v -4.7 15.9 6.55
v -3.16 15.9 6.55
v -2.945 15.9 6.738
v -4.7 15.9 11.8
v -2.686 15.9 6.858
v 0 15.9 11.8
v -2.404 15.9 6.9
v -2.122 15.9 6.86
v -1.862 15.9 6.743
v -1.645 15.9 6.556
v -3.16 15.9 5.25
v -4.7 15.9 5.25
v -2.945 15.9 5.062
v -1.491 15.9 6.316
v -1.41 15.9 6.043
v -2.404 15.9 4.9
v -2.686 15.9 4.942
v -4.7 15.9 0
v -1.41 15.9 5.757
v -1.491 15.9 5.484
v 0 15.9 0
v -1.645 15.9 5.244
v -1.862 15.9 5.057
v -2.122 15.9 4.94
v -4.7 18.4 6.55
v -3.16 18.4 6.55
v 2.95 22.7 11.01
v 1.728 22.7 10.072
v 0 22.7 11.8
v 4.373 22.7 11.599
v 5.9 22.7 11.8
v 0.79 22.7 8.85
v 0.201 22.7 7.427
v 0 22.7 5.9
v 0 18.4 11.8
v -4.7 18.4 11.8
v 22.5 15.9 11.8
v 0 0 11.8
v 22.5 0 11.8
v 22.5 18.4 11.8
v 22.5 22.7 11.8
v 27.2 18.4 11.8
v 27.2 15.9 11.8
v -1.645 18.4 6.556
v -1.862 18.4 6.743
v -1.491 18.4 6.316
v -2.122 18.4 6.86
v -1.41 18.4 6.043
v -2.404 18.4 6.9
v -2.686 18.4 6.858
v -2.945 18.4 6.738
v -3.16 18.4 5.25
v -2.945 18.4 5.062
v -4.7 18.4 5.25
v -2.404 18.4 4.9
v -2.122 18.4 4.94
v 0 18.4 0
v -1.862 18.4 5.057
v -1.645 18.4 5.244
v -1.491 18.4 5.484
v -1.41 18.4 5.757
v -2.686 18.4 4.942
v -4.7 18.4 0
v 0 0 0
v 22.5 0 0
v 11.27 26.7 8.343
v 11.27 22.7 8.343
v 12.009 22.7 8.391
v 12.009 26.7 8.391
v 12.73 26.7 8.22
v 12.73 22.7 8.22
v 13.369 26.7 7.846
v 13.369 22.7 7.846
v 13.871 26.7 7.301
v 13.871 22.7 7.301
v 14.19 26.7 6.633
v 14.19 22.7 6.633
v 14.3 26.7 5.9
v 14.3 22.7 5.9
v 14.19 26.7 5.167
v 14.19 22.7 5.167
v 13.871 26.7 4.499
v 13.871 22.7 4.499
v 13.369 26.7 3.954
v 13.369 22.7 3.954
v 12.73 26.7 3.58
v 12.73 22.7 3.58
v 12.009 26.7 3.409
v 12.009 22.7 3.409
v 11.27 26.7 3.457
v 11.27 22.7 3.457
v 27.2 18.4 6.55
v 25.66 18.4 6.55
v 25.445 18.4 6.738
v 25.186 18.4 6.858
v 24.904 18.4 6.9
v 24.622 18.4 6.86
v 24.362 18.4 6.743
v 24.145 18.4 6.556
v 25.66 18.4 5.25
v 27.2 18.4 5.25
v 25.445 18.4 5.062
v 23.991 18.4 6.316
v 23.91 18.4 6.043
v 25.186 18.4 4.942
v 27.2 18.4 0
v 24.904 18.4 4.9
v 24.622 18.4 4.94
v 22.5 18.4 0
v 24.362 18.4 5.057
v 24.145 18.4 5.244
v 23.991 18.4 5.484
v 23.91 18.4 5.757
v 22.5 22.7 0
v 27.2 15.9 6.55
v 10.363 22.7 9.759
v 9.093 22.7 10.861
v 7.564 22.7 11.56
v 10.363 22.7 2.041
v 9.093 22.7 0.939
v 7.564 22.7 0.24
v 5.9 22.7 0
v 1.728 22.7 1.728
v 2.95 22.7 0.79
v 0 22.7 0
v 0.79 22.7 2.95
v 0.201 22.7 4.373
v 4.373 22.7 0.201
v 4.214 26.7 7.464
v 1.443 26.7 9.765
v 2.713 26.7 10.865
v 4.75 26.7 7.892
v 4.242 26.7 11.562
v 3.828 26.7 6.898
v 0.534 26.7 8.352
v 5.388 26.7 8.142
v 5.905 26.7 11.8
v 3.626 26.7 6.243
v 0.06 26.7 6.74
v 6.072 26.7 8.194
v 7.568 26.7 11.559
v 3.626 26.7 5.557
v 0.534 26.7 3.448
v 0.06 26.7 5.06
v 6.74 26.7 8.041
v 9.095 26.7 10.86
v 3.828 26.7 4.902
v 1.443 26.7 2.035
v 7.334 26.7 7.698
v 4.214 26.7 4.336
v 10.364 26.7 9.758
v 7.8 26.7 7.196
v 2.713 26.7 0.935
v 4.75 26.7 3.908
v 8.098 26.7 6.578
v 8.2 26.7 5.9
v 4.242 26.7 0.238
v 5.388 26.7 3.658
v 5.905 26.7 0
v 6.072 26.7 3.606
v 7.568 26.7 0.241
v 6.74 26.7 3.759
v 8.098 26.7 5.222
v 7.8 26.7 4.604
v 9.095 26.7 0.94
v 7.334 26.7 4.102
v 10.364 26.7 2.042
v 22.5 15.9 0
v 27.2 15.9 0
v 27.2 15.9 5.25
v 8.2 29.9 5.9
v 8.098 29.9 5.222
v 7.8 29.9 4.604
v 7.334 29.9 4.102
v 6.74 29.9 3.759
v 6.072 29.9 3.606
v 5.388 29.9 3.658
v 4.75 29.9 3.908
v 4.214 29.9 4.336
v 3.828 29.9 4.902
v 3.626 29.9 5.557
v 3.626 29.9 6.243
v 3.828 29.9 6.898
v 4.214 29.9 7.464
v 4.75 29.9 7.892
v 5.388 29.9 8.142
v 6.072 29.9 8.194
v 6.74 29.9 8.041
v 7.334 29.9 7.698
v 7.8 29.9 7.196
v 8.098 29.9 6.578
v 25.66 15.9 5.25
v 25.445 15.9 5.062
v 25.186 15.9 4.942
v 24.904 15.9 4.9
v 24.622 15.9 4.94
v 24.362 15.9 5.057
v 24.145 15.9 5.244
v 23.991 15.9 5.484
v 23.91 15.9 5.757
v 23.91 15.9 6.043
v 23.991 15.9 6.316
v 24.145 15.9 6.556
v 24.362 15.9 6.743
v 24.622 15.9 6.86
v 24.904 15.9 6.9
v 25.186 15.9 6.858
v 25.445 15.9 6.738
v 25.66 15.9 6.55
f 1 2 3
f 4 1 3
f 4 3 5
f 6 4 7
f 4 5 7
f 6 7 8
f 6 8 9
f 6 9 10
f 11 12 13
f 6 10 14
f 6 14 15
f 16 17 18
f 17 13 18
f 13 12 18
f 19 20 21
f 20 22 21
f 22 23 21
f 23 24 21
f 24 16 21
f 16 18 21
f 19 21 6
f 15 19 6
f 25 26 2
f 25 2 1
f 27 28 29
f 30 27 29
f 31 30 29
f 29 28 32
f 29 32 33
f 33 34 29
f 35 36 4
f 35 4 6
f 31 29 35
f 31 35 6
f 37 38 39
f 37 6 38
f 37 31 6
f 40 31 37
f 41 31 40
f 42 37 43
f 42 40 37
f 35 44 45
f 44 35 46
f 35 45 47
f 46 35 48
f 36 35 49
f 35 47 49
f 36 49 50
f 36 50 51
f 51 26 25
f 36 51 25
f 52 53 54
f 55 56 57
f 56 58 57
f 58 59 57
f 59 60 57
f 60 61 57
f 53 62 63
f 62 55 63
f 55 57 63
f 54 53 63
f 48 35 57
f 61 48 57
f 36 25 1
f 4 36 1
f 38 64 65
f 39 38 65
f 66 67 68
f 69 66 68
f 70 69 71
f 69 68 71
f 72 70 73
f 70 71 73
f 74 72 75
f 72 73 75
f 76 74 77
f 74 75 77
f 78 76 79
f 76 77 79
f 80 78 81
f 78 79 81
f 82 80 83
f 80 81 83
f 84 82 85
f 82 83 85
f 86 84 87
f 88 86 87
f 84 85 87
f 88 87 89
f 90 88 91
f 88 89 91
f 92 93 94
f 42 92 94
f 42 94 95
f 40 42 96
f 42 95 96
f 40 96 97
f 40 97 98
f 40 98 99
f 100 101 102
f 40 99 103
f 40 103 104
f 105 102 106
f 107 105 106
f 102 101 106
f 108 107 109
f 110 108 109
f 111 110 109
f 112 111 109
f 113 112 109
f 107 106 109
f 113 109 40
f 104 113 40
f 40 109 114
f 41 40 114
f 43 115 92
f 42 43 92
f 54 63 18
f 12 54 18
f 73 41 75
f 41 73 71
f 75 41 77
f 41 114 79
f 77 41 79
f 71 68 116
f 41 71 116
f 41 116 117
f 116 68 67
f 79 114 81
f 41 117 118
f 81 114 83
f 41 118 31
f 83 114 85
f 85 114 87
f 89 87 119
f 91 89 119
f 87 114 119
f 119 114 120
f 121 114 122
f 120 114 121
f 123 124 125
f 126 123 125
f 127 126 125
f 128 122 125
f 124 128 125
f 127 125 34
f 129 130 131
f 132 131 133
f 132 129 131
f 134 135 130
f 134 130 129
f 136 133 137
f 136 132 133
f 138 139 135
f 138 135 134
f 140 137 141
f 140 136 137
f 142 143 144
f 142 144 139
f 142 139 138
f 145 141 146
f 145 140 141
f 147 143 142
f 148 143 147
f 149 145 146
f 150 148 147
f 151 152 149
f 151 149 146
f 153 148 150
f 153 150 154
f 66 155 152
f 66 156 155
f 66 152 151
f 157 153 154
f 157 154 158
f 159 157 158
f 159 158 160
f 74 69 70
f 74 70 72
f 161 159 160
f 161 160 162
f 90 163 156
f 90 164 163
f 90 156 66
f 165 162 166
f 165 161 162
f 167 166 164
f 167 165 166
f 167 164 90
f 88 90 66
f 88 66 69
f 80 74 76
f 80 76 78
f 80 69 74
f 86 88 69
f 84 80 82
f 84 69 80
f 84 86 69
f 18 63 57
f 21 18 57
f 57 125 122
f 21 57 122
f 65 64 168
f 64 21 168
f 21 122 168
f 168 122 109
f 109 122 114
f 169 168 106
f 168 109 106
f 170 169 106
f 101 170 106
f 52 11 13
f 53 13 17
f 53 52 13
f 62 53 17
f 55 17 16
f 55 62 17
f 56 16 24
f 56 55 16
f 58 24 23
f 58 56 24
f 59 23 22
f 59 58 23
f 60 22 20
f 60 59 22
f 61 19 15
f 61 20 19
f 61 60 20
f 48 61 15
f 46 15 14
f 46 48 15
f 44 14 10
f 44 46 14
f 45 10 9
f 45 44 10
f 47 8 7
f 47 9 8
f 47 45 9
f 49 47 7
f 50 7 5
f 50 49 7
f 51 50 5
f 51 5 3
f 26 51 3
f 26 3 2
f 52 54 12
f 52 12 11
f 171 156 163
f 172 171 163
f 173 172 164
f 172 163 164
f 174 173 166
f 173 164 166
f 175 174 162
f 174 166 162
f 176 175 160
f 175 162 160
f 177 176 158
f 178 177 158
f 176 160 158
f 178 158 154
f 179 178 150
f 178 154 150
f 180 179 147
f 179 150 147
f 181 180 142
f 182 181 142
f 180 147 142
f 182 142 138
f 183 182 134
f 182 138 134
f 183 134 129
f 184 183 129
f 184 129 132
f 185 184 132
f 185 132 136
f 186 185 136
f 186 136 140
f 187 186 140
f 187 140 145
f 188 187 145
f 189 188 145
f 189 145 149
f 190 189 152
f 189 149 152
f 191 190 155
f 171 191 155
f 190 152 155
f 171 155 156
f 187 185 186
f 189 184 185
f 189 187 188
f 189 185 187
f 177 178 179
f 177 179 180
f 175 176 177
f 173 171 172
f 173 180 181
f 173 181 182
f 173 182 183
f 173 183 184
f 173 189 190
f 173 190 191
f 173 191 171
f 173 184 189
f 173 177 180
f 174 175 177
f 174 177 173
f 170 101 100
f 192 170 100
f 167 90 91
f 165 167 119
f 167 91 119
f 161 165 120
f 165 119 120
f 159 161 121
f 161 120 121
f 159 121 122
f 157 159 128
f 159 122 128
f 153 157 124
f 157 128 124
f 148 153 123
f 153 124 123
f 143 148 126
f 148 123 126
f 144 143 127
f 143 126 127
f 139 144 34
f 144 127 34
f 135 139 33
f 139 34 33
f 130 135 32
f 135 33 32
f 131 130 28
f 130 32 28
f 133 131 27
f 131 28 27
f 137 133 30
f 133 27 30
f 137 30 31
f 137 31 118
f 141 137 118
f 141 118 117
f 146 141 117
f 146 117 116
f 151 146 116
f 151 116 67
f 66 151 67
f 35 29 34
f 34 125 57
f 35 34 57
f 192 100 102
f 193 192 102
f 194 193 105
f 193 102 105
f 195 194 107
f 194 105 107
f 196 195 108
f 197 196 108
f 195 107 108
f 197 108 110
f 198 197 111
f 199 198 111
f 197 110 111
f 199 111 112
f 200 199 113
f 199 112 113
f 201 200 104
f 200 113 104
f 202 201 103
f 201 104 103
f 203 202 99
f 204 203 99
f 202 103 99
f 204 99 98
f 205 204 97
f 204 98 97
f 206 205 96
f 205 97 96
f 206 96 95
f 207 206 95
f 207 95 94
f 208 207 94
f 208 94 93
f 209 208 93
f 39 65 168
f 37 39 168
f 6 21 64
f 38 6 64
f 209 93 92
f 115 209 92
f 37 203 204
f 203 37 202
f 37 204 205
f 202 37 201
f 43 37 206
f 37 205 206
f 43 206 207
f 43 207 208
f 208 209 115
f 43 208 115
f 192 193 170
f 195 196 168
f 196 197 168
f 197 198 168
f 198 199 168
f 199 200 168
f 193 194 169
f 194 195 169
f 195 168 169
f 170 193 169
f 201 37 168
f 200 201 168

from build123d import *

# Parameters (mm, degrees)
BOSS_EXTRUDE1_DEPTH = 11.8
BOSS_EXTRUDE2_DEPTH = 4
SKETCH4_R           = 2.3
BOSS_EXTRUDE3_DEPTH = 3.2
CUT_EXTRUDE1_DEPTH  = 3.2
CUT_EXTRUDE2_DEPTH  = 3.2


with BuildPart() as part:
    # Sketch2 → Boss-Extrude1 (new body)
    with BuildSketch(Plane.XY):
        Polygon((0, 0), (22.5, 0), (22.5, 15.9), (27.2, 15.9), (27.2, 18.4), (22.5, 18.4), (22.5, 22.7), (0, 22.7), (0, 18.4), (-4.7, 18.4), (-4.7, 15.9), (0, 15.9), align=None)
    extrude(amount=BOSS_EXTRUDE1_DEPTH)

    # Sketch3 → Boss-Extrude2 (add)
    with BuildSketch(Plane(origin=(0, 22.7, 0), x_dir=(1, 0, 0), z_dir=(0, 1, 0))):
        with BuildLine():
            ThreePointArc((11.270338983, -3.456752324), (0, -5.9), (11.270338983, -8.343247676))
            ThreePointArc((11.270338983, -8.343247676), (14.3, -5.9), (11.270338983, -3.456752324))
        make_face()
    extrude(amount=BOSS_EXTRUDE2_DEPTH)

    # Sketch4 → Boss-Extrude3 (add)
    with BuildSketch(Plane(origin=(0, 26.7, 0), x_dir=(1, 0, 0), z_dir=(0, 1, 0))):
        with Locations((5.9, -5.9)):
            Circle(SKETCH4_R)
    extrude(amount=BOSS_EXTRUDE3_DEPTH)

    # Sketch5 → Cut-Extrude1 (cut)
    with BuildSketch(Plane(origin=(0, 18.4, 0), x_dir=(1, 0, 0), z_dir=(0, 1, 0))):
        with BuildLine():
            Line((27.2, -5.9), (27.2, -5.25))
            Line((27.2, -5.25), (25.659934208, -5.25))
            ThreePointArc((25.659934208, -5.25), (23.9, -5.9), (25.659934208, -6.55))
            Line((25.659934208, -6.55), (27.2, -6.55))
            Line((27.2, -6.55), (27.2, -5.9))
        make_face()
    extrude(amount=-CUT_EXTRUDE1_DEPTH, mode=Mode.SUBTRACT)

    # Sketch6 → Cut-Extrude2 (cut)
    with BuildSketch(Plane(origin=(0, 18.4, 0), x_dir=(1, 0, 0), z_dir=(0, 1, 0))):
        with BuildLine():
            Line((-4.7, -5.9), (-4.7, -5.25))
            Line((-4.7, -5.25), (-3.159934208, -5.25))
            ThreePointArc((-3.159934208, -5.25), (-1.4, -5.9), (-3.159934208, -6.55))
            Line((-3.159934208, -6.55), (-4.7, -6.55))
            Line((-4.7, -6.55), (-4.7, -5.9))
        make_face()
    extrude(amount=-CUT_EXTRUDE2_DEPTH, mode=Mode.SUBTRACT)


solid = part.part
